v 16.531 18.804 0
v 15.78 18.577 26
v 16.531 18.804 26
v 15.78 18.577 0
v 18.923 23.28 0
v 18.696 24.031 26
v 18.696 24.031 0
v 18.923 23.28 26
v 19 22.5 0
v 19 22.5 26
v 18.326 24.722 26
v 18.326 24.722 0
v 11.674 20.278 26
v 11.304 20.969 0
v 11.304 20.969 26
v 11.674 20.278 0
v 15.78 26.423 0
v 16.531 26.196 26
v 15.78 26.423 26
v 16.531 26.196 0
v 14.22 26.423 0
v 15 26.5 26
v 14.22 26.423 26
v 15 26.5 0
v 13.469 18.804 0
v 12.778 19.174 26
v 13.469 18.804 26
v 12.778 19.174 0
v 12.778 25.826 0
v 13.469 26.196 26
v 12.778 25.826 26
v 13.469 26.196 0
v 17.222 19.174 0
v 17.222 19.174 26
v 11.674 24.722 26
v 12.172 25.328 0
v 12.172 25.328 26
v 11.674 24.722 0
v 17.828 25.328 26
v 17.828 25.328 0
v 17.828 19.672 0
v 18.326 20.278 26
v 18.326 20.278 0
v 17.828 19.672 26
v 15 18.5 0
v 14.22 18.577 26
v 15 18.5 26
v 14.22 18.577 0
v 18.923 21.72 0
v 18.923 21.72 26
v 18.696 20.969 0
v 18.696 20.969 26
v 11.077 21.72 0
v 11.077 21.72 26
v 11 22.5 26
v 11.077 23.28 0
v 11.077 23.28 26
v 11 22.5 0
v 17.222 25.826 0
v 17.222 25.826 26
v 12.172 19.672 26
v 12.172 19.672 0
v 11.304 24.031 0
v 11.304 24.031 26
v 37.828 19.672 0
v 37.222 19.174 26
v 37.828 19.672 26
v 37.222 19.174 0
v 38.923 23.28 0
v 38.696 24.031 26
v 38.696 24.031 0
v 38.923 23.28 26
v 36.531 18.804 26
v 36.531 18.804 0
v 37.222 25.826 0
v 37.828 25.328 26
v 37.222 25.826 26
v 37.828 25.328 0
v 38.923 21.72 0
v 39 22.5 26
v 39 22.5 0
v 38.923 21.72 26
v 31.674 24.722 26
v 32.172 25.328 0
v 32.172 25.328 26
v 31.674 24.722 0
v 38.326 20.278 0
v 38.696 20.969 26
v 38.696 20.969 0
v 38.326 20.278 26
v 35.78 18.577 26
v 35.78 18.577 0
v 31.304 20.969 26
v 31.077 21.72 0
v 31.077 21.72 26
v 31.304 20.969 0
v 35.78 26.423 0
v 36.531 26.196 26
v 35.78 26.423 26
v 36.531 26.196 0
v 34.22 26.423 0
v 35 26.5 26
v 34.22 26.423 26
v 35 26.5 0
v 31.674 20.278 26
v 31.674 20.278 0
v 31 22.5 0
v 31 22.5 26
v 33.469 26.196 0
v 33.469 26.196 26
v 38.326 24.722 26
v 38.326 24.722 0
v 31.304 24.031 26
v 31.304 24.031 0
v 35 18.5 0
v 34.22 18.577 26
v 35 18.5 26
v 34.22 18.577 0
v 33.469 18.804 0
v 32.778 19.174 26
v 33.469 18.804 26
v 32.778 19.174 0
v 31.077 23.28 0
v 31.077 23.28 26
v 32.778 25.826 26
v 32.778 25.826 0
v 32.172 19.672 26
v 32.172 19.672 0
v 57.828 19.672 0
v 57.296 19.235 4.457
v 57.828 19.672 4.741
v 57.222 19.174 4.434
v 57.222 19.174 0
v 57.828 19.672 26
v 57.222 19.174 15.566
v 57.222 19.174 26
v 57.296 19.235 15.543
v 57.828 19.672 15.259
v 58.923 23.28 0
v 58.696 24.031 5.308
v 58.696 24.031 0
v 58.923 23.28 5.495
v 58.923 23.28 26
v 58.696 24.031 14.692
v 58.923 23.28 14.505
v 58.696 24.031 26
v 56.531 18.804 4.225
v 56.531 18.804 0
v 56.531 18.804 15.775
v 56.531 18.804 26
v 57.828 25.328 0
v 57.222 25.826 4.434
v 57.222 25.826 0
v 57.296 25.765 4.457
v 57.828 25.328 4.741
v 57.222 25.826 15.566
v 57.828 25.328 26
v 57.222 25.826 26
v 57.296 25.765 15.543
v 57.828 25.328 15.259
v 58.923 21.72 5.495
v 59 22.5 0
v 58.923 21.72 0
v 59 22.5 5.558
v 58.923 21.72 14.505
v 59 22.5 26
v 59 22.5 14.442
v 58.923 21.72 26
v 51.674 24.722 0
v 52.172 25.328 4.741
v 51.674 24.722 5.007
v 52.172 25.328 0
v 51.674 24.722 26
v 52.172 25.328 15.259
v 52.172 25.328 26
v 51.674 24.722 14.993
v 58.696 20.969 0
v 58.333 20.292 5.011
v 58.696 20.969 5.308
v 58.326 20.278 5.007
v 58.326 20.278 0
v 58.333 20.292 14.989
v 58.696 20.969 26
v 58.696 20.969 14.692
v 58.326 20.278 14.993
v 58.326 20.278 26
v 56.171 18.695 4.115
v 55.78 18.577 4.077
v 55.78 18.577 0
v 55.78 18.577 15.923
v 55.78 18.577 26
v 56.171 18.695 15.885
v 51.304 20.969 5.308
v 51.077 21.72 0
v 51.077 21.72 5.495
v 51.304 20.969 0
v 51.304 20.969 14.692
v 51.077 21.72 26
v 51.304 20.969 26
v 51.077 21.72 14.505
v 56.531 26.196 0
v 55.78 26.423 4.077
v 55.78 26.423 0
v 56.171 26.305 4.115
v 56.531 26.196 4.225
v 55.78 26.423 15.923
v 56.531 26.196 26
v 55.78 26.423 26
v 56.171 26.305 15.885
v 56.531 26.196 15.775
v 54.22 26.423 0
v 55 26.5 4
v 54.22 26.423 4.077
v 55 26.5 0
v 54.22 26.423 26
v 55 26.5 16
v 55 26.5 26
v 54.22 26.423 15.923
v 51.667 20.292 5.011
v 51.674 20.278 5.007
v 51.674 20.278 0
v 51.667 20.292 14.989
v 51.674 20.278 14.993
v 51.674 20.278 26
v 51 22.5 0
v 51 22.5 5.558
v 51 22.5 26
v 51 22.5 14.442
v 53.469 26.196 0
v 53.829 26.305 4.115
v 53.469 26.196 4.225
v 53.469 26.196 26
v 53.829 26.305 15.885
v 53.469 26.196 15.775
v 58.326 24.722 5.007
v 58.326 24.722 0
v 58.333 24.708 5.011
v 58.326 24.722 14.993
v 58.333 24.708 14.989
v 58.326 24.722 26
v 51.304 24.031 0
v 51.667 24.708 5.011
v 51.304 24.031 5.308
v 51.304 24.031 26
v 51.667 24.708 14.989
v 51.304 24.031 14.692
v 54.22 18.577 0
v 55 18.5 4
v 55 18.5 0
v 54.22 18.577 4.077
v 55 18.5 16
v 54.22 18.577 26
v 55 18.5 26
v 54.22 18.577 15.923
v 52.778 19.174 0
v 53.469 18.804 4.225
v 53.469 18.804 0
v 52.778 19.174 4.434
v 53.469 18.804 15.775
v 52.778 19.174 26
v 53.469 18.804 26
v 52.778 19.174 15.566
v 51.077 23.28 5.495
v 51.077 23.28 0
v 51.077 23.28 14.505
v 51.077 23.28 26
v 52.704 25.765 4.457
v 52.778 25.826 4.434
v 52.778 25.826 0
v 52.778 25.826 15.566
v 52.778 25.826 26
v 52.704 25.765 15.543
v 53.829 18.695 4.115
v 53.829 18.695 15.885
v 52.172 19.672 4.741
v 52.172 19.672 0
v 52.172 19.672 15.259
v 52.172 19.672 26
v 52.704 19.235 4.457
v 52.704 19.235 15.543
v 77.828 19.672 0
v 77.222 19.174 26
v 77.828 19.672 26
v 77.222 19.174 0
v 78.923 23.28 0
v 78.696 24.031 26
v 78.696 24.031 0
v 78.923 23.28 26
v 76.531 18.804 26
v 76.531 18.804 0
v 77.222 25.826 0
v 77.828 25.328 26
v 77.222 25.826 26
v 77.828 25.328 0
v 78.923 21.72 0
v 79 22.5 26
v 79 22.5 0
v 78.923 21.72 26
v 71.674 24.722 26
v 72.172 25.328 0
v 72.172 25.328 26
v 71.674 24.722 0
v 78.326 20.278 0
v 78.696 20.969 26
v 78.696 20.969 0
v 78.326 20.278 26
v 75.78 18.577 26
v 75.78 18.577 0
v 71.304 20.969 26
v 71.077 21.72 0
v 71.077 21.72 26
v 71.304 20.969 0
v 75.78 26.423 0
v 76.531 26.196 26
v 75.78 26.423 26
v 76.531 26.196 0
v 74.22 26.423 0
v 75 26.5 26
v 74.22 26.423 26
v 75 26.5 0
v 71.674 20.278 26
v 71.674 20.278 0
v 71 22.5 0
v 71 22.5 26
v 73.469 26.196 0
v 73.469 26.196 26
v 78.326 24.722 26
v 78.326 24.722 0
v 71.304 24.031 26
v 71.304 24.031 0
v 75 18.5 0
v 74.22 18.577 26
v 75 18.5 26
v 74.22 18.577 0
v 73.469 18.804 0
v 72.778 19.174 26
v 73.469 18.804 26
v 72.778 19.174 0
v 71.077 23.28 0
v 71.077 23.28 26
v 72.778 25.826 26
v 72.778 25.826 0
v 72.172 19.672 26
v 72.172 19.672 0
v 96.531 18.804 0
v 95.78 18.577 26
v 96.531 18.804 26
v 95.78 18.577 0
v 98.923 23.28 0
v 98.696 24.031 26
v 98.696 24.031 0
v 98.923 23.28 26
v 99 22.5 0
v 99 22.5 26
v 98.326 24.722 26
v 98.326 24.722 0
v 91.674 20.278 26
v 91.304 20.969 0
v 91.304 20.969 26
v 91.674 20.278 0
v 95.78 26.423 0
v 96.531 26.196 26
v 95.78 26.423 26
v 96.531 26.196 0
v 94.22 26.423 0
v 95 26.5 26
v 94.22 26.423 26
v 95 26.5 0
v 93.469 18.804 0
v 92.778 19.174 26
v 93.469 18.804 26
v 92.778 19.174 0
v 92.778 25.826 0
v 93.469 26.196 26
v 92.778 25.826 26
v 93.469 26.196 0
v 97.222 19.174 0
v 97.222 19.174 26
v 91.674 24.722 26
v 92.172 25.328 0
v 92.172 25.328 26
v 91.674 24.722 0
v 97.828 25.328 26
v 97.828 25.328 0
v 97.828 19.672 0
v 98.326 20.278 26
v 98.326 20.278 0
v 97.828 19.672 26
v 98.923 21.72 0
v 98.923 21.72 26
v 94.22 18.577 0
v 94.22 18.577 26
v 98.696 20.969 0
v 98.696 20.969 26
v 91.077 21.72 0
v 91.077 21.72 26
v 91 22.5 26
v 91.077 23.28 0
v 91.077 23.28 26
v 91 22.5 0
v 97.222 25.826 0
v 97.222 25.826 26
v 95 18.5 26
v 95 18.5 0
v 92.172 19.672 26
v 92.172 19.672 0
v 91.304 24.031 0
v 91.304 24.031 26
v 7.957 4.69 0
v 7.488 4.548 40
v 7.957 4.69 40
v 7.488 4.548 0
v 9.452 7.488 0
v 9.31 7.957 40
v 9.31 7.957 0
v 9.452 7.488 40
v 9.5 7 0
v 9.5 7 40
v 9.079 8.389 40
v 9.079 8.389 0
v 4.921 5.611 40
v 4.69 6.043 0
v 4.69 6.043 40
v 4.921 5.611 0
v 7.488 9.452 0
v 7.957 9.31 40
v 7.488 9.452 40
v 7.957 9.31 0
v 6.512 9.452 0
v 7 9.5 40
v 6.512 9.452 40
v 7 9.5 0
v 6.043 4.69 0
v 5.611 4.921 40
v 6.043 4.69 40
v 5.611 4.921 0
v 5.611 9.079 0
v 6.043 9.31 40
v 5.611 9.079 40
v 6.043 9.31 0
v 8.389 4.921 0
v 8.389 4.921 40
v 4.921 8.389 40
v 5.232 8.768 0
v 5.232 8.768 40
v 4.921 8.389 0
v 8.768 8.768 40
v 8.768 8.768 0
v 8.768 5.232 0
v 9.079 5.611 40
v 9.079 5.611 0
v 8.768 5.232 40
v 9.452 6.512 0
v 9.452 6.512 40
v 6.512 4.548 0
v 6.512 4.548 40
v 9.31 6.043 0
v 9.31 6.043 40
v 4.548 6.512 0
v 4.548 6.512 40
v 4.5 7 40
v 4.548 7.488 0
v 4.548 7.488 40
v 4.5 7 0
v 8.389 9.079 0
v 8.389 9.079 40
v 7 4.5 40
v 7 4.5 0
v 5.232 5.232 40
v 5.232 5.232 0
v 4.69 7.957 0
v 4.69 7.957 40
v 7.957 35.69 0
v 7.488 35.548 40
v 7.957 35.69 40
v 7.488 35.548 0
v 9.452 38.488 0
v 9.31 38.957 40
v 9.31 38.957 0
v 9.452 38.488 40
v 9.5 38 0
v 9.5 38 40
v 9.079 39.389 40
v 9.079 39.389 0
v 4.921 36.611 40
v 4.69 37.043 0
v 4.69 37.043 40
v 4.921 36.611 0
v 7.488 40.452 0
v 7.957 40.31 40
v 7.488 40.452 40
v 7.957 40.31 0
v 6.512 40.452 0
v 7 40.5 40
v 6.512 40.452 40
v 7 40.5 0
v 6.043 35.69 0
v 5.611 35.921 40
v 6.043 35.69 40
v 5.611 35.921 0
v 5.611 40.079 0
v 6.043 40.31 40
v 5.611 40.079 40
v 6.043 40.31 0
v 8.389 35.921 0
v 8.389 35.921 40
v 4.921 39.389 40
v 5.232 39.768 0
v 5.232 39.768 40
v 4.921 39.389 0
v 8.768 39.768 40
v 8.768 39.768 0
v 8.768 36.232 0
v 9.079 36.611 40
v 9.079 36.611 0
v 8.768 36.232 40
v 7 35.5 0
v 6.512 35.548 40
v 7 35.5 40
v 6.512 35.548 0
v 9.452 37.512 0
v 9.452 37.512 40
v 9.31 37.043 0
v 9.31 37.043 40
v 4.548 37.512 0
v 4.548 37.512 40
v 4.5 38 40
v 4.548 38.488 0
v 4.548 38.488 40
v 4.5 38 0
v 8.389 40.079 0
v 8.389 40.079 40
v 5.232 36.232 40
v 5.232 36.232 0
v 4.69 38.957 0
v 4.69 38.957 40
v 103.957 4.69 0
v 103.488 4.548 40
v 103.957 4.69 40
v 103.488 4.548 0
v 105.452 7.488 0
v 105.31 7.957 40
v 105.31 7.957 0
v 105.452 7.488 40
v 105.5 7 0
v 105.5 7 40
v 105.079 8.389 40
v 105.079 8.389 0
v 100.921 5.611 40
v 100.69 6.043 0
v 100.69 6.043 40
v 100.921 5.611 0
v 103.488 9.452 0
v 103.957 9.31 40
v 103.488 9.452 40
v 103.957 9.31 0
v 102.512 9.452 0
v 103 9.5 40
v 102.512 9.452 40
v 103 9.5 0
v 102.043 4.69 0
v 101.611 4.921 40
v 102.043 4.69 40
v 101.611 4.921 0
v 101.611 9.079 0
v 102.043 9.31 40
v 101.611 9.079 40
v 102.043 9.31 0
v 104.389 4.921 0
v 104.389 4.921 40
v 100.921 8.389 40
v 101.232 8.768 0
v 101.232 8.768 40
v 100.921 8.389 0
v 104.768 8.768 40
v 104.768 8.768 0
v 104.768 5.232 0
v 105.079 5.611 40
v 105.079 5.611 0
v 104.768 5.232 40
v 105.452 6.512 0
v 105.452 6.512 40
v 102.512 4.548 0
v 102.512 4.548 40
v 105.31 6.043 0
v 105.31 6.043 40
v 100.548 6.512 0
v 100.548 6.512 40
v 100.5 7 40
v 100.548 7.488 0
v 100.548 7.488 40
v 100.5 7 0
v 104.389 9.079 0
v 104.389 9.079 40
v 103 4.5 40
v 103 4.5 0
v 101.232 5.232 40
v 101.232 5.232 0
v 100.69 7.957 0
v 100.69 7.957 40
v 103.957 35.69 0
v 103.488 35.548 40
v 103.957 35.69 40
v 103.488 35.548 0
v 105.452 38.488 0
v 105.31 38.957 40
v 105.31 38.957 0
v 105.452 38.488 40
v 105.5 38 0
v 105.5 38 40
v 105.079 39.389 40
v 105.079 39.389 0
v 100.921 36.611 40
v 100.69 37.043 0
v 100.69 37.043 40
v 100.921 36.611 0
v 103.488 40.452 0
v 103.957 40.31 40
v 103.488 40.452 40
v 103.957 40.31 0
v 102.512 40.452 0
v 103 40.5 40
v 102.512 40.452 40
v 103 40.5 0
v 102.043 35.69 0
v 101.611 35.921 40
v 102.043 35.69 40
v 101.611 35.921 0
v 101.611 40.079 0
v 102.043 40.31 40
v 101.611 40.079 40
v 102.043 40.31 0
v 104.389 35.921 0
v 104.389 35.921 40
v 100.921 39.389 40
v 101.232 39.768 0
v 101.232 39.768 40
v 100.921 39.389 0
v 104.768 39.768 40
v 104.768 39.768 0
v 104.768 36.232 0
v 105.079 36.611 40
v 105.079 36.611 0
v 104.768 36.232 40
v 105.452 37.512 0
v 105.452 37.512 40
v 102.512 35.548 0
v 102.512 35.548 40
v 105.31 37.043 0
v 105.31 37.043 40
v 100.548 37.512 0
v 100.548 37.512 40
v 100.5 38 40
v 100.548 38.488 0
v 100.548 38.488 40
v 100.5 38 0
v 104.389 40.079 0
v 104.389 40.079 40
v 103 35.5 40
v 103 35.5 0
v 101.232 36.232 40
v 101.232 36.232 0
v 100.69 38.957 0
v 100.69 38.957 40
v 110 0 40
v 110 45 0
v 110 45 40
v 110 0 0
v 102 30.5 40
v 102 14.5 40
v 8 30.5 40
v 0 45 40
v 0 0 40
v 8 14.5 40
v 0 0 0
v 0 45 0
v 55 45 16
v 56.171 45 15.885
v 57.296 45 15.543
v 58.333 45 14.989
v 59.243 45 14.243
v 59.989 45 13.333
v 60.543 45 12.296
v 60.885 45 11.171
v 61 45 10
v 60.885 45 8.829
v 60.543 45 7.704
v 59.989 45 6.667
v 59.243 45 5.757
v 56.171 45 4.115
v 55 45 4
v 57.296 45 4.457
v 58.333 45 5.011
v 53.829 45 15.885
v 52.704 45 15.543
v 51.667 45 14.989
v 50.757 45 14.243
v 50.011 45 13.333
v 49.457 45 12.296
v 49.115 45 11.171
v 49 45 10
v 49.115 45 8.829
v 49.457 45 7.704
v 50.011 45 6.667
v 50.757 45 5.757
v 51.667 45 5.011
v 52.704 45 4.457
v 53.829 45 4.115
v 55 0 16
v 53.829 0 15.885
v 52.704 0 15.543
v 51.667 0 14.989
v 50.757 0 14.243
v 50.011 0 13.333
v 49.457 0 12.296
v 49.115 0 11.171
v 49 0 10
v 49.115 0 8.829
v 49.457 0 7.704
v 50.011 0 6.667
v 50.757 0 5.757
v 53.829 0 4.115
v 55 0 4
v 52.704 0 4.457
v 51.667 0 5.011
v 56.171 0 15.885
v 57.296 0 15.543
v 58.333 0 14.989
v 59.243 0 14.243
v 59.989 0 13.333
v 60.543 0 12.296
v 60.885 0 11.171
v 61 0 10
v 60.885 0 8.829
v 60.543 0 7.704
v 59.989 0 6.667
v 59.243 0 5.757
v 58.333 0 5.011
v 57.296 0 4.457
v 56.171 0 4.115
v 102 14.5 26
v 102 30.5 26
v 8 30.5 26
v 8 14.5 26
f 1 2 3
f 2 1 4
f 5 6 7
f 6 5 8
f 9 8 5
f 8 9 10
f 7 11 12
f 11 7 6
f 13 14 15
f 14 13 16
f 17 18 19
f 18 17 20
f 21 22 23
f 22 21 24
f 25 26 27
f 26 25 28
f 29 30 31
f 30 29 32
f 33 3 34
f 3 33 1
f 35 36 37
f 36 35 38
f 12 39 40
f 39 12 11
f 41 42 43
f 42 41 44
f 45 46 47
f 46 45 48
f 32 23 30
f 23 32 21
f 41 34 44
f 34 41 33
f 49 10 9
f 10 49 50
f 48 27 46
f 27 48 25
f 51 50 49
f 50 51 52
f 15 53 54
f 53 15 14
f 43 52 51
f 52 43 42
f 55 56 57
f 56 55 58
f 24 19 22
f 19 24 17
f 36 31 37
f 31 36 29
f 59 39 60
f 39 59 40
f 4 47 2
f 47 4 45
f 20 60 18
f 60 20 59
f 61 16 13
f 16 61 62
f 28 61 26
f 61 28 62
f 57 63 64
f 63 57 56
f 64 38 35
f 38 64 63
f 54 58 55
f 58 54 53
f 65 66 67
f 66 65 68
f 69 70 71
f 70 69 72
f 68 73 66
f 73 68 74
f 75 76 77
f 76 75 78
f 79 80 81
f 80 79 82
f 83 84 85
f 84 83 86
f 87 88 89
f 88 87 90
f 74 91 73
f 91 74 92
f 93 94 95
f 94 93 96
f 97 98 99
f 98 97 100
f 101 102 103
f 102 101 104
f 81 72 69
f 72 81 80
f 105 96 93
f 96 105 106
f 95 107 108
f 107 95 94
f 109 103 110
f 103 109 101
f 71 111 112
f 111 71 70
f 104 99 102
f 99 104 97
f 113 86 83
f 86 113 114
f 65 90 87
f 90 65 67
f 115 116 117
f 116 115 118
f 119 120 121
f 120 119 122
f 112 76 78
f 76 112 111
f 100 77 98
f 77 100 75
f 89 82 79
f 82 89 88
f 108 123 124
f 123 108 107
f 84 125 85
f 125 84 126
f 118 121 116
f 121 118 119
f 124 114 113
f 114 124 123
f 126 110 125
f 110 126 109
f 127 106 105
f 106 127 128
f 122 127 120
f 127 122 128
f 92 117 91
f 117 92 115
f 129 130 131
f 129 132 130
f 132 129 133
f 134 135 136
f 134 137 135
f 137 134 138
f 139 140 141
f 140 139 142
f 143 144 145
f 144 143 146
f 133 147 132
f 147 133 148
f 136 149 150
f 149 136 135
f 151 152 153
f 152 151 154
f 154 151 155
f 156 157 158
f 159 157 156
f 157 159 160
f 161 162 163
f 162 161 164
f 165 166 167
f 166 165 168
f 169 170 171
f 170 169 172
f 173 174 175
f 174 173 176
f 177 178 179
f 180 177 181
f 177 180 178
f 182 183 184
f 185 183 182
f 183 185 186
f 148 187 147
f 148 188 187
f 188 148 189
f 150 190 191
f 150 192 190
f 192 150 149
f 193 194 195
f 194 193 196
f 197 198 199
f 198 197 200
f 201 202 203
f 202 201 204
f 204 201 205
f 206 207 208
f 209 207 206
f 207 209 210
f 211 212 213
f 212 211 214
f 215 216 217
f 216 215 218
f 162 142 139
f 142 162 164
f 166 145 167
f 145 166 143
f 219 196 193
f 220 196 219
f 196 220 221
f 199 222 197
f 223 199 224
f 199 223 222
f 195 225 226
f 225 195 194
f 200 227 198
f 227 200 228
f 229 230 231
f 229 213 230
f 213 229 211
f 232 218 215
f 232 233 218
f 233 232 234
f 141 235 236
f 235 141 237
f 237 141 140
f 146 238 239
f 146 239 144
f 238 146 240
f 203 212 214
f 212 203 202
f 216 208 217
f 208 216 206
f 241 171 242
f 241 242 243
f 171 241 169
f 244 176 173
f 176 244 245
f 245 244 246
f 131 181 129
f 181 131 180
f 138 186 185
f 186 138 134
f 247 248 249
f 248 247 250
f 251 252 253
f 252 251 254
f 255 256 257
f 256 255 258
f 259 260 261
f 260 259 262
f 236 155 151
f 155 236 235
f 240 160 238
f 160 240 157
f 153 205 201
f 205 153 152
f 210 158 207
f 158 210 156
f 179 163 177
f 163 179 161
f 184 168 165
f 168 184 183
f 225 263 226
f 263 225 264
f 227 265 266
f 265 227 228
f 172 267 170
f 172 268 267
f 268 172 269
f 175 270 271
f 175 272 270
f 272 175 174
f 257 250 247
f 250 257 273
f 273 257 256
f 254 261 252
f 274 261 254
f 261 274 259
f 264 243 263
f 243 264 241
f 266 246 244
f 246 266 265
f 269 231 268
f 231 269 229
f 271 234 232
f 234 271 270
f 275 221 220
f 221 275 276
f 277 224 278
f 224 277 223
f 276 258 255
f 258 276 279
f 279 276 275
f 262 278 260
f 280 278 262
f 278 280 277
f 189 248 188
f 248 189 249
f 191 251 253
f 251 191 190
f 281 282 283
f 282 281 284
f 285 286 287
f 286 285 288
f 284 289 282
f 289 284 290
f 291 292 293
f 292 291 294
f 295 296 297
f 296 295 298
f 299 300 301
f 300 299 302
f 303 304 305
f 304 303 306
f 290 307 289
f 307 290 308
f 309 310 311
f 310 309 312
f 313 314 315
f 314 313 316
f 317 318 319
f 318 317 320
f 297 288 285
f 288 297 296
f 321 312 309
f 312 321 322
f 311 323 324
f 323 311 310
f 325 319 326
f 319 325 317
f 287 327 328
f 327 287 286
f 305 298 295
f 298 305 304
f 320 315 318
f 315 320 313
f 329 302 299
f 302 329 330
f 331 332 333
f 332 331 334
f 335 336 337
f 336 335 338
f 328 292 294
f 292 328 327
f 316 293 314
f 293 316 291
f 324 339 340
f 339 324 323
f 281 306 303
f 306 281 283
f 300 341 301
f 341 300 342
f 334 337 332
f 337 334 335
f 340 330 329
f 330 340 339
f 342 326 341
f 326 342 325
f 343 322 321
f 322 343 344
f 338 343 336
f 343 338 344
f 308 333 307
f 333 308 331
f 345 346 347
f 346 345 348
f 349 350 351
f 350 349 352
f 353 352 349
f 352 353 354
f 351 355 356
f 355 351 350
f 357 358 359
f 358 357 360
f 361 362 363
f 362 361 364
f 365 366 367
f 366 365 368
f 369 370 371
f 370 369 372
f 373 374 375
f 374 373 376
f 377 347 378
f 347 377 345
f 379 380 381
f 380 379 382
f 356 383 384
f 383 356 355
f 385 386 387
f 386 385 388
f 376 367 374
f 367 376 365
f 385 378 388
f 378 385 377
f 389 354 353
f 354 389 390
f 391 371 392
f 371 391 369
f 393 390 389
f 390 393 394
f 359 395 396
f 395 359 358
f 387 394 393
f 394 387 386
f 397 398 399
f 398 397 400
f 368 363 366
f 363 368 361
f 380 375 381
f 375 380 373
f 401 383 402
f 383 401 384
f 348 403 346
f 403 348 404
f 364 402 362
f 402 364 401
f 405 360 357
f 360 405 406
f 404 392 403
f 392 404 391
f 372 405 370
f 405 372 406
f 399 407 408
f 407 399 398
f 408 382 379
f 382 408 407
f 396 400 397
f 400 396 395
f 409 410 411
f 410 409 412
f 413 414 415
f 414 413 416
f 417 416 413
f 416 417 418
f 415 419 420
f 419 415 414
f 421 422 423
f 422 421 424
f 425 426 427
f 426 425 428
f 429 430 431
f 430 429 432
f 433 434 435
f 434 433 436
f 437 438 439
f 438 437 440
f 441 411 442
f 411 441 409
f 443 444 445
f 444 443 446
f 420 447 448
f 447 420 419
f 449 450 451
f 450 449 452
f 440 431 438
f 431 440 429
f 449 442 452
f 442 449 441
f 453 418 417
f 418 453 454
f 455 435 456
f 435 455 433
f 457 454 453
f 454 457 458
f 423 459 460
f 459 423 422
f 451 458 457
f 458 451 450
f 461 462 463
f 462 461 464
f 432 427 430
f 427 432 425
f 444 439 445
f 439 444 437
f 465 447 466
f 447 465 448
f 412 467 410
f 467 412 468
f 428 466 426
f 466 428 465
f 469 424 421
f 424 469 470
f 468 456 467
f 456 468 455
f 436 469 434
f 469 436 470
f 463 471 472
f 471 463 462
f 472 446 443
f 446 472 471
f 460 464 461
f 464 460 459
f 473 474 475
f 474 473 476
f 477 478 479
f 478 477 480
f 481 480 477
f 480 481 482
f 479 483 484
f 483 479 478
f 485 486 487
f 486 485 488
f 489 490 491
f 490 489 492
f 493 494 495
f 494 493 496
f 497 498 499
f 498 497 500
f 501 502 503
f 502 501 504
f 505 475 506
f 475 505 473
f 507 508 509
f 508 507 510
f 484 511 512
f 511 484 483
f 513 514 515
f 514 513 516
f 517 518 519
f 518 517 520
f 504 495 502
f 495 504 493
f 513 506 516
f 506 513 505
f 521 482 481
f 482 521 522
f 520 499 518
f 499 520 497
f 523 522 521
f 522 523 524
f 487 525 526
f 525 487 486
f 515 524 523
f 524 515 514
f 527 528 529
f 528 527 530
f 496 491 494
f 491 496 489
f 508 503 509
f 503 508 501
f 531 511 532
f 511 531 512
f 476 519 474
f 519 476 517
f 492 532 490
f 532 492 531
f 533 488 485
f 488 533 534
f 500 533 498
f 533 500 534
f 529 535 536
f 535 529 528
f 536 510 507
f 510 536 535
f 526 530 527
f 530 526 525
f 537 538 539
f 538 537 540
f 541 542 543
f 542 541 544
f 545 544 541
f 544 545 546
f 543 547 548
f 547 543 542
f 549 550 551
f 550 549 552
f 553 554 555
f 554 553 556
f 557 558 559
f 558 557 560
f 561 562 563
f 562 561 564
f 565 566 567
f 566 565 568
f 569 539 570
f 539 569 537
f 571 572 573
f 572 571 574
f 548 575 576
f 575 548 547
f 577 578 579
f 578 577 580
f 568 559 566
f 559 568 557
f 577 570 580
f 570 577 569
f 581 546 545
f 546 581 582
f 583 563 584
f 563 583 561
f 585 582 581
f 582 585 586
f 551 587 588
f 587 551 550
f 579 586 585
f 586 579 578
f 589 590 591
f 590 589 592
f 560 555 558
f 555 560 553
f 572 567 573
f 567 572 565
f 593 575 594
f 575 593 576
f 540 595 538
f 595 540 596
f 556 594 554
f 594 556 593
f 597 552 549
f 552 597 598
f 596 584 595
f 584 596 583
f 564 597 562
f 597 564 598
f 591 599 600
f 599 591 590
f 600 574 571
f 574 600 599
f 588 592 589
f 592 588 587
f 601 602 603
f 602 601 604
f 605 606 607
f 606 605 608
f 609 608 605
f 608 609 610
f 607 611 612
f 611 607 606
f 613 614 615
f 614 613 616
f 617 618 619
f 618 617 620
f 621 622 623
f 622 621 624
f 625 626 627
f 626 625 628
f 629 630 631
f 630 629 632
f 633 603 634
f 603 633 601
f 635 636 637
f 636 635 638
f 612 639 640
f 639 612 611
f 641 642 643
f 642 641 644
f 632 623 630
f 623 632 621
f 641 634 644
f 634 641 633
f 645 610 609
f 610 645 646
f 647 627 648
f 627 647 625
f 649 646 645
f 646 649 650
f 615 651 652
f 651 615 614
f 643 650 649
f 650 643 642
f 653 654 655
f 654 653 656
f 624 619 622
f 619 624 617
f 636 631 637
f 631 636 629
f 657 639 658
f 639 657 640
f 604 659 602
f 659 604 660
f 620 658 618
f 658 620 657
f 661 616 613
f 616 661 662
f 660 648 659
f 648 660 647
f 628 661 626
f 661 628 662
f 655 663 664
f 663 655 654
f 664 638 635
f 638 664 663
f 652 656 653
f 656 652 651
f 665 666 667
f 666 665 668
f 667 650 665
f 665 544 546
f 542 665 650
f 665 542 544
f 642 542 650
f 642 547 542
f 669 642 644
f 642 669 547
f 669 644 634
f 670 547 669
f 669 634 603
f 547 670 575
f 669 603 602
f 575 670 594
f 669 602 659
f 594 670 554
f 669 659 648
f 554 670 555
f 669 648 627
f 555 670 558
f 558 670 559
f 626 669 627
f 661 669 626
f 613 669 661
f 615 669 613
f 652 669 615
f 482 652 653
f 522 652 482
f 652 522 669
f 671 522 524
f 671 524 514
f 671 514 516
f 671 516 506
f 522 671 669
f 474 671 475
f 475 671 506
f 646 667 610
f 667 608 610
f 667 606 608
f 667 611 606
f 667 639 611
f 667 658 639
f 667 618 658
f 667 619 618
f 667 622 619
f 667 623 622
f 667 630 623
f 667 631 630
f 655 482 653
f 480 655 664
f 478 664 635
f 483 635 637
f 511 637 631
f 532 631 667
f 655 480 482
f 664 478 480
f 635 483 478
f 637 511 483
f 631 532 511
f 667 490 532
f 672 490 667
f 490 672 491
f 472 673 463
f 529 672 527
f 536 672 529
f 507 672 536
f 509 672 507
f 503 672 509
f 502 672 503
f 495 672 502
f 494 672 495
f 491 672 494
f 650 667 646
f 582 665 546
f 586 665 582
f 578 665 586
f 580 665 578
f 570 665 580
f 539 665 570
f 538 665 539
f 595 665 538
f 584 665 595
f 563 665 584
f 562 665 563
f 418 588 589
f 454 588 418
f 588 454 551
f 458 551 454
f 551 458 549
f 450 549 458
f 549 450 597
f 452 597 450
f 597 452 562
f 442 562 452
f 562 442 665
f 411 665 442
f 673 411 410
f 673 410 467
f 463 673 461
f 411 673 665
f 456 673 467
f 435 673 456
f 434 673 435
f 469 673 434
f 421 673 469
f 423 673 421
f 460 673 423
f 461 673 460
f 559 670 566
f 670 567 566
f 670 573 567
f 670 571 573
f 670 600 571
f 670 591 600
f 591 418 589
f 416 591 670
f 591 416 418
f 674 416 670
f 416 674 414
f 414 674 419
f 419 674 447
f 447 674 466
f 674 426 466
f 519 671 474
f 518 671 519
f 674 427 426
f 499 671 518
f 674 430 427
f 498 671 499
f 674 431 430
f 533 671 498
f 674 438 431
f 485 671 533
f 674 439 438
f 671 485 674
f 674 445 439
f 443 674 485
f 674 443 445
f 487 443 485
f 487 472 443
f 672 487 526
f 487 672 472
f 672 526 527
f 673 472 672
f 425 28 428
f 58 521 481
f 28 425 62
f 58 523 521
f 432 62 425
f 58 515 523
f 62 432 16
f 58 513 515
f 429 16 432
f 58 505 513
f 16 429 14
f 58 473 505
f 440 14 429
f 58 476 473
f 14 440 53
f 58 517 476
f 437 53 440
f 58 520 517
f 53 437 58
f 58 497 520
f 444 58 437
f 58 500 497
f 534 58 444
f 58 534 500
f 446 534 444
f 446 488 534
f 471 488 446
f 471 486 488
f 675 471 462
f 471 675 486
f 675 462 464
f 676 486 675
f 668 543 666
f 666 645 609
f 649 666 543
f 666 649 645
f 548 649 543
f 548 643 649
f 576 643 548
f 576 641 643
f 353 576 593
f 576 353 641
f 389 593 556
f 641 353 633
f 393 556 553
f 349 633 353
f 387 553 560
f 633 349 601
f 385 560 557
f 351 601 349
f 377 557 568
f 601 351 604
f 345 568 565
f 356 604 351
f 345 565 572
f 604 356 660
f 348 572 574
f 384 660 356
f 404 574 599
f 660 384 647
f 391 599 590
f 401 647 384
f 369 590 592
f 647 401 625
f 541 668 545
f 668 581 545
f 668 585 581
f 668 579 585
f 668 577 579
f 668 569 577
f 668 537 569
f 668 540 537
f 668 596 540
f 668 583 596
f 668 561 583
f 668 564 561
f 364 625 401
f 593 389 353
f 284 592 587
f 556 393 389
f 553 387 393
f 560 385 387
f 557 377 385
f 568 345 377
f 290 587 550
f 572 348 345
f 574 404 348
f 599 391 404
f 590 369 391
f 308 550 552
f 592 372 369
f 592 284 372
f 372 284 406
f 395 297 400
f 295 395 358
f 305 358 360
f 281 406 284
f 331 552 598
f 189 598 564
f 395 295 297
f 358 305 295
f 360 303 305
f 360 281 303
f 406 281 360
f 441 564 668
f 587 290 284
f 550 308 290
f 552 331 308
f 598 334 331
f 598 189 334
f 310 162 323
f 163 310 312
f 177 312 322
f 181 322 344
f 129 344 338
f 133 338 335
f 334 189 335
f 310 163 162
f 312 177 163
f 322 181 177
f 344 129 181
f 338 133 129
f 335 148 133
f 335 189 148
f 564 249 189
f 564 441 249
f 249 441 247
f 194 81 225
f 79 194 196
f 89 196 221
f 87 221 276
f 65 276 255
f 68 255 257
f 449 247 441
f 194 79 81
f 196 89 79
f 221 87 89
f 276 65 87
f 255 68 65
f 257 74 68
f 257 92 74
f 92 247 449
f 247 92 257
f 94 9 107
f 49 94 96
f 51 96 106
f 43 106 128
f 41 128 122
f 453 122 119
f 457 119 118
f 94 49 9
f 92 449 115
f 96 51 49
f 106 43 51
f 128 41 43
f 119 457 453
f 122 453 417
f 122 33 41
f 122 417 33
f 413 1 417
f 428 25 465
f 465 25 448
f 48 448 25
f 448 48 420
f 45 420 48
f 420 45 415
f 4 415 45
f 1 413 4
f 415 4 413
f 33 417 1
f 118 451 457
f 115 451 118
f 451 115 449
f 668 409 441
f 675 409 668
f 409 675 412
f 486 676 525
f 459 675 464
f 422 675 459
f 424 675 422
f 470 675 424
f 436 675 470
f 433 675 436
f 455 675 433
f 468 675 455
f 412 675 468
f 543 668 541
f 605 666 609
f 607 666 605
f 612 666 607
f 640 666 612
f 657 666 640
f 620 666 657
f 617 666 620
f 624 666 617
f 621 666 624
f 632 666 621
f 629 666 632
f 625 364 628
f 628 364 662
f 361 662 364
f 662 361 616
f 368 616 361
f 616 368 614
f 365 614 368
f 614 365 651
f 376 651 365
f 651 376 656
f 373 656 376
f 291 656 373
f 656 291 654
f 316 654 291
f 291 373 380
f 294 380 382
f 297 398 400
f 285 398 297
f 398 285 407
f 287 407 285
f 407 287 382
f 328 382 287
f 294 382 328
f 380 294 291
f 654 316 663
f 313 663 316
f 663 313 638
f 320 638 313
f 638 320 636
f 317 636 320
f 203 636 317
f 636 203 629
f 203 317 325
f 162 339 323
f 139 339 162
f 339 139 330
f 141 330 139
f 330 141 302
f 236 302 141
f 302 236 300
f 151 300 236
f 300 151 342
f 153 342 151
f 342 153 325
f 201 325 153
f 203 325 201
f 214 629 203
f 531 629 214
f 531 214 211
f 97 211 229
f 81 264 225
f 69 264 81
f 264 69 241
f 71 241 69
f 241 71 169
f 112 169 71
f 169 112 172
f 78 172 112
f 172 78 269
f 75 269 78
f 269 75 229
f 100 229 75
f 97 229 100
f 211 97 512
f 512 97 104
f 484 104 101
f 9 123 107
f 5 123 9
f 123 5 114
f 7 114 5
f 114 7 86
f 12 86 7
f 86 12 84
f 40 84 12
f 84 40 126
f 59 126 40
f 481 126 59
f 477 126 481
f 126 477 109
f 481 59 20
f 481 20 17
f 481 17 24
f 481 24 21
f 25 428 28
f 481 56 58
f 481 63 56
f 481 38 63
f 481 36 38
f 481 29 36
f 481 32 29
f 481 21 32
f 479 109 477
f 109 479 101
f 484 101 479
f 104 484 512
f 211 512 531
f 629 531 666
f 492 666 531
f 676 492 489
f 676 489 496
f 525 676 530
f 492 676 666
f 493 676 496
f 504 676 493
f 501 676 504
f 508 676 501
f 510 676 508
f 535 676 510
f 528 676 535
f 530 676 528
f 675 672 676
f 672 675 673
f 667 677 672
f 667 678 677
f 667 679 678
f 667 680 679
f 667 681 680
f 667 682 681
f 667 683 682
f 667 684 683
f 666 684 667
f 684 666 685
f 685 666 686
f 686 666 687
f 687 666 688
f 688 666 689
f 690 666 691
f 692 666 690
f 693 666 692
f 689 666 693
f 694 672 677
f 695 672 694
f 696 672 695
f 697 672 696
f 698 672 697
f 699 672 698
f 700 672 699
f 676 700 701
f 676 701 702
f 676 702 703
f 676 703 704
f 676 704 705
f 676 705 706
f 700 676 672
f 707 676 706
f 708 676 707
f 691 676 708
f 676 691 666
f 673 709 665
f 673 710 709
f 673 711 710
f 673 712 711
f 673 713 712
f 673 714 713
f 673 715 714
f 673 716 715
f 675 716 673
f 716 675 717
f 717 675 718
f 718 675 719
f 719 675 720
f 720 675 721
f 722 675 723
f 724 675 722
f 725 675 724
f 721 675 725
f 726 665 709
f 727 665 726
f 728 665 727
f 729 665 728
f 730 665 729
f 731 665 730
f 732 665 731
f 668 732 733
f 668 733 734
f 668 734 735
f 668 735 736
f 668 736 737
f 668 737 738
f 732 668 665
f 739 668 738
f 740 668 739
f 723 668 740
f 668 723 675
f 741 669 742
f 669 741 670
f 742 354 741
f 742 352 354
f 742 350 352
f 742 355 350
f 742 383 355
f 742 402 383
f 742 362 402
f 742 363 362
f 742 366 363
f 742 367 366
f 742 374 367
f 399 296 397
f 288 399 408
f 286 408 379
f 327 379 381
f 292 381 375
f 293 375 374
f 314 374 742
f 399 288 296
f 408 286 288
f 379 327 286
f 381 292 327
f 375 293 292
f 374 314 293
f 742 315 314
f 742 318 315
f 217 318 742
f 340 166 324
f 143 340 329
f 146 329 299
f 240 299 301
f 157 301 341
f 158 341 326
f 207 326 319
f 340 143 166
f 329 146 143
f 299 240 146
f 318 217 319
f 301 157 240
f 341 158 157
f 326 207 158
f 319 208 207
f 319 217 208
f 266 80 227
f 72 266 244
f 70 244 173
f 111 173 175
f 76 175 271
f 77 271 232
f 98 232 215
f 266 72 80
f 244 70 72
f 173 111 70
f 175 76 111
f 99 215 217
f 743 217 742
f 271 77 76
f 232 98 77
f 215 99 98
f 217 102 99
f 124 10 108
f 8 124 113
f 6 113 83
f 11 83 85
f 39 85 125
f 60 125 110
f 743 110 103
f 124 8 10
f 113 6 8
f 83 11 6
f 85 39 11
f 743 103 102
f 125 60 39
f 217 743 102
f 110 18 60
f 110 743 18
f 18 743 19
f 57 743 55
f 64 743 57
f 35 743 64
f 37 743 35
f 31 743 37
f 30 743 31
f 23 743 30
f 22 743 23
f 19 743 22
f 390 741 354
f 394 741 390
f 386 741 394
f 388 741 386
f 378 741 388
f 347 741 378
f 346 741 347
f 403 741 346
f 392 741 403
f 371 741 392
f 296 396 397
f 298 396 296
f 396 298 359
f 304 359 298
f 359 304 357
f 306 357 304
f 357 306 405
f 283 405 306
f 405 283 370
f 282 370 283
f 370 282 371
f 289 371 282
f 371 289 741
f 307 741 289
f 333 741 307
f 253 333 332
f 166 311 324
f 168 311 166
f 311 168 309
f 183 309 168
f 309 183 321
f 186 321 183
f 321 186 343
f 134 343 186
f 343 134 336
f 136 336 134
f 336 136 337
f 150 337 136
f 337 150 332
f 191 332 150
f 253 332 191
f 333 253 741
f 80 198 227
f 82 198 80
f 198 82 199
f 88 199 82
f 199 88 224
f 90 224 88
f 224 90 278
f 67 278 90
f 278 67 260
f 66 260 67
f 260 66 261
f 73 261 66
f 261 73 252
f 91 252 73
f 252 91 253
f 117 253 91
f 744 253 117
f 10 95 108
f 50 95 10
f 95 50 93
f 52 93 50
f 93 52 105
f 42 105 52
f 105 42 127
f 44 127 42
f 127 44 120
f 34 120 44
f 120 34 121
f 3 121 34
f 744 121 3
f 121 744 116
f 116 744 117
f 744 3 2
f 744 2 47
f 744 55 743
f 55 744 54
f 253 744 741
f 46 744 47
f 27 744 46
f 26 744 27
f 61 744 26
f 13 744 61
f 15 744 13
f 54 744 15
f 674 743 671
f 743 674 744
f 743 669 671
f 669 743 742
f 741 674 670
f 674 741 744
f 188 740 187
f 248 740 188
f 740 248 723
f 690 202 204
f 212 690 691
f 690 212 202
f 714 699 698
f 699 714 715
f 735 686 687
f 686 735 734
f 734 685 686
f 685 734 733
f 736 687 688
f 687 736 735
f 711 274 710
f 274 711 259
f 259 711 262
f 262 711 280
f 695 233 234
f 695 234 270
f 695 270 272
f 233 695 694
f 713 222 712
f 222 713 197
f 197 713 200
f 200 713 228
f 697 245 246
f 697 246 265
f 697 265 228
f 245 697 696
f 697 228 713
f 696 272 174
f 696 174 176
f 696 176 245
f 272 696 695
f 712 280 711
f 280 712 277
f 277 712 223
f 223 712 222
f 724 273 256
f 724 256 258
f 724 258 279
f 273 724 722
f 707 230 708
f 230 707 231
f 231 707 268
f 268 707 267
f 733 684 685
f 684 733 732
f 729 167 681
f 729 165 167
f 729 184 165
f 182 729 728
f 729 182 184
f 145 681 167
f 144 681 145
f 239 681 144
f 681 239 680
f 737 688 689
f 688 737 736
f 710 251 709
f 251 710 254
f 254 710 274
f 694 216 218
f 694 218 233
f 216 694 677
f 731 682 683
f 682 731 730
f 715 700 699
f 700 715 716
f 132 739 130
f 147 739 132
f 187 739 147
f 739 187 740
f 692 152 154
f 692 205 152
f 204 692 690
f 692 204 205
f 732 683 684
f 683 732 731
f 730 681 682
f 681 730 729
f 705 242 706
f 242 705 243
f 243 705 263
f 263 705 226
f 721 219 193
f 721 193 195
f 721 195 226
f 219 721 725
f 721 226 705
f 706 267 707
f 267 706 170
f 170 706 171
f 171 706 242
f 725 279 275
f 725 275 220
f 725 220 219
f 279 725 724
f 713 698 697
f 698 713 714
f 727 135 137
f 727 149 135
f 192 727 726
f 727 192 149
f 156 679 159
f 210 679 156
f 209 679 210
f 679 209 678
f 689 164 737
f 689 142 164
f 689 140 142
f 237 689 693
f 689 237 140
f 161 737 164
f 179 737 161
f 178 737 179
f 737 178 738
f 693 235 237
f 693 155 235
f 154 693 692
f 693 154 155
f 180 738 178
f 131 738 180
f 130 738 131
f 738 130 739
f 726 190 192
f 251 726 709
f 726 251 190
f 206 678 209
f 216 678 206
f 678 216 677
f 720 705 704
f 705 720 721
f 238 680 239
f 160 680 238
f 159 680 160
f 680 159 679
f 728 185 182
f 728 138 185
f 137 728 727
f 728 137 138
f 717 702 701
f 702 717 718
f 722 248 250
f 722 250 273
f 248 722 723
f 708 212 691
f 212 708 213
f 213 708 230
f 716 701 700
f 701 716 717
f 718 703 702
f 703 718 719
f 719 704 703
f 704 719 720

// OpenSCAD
$fn = 32;

// ----------------------------------------------------------------------
// Manifold block: side_outlet manifold
// ----------------------------------------------------------------------

// --- parameters (mm) ---
block_l = 110;            // block length, X
block_w = 45;             // block width, Y
block_h = 40;             // block height, Z
port_d = 8;               // port bore diameter
port_pitch = 20;          // port pitch along X
gallery_d = 16;           // top gallery width, Y
gallery_depth = 14;       // gallery pocket depth
wall_p = 8;               // gallery end wall thickness, X
mnt_d = 5;                // mounting hole diameter
mnt_in = 7;               // mounting hole inset from the edges
out_d = 12;               // outlet bore diameter
out_z = 10;               // outlet axis height

n_ports = 5;  // ports in the row
port_x0 = (block_l - (n_ports - 1) * port_pitch) / 2;  // first port X

difference() {
  cube([block_l, block_w, block_h]);
  for (i = [0 : n_ports - 1])
    translate([port_x0 + i * port_pitch, block_w / 2, -1])
      cylinder(h = block_h + 2, d = port_d);
  translate([wall_p, block_w / 2 - gallery_d / 2, block_h - gallery_depth])
    cube([block_l - 2 * wall_p, gallery_d, gallery_depth + 1]);
  for (cx = [mnt_in, block_l - mnt_in])
    for (cy = [mnt_in, block_w - mnt_in])
      translate([cx, cy, -1]) cylinder(h = block_h + 2, d = mnt_d);
  translate([block_l / 2, -1, out_z]) rotate([-90, 0, 0])
    cylinder(h = block_w + 2, d = out_d);
}
